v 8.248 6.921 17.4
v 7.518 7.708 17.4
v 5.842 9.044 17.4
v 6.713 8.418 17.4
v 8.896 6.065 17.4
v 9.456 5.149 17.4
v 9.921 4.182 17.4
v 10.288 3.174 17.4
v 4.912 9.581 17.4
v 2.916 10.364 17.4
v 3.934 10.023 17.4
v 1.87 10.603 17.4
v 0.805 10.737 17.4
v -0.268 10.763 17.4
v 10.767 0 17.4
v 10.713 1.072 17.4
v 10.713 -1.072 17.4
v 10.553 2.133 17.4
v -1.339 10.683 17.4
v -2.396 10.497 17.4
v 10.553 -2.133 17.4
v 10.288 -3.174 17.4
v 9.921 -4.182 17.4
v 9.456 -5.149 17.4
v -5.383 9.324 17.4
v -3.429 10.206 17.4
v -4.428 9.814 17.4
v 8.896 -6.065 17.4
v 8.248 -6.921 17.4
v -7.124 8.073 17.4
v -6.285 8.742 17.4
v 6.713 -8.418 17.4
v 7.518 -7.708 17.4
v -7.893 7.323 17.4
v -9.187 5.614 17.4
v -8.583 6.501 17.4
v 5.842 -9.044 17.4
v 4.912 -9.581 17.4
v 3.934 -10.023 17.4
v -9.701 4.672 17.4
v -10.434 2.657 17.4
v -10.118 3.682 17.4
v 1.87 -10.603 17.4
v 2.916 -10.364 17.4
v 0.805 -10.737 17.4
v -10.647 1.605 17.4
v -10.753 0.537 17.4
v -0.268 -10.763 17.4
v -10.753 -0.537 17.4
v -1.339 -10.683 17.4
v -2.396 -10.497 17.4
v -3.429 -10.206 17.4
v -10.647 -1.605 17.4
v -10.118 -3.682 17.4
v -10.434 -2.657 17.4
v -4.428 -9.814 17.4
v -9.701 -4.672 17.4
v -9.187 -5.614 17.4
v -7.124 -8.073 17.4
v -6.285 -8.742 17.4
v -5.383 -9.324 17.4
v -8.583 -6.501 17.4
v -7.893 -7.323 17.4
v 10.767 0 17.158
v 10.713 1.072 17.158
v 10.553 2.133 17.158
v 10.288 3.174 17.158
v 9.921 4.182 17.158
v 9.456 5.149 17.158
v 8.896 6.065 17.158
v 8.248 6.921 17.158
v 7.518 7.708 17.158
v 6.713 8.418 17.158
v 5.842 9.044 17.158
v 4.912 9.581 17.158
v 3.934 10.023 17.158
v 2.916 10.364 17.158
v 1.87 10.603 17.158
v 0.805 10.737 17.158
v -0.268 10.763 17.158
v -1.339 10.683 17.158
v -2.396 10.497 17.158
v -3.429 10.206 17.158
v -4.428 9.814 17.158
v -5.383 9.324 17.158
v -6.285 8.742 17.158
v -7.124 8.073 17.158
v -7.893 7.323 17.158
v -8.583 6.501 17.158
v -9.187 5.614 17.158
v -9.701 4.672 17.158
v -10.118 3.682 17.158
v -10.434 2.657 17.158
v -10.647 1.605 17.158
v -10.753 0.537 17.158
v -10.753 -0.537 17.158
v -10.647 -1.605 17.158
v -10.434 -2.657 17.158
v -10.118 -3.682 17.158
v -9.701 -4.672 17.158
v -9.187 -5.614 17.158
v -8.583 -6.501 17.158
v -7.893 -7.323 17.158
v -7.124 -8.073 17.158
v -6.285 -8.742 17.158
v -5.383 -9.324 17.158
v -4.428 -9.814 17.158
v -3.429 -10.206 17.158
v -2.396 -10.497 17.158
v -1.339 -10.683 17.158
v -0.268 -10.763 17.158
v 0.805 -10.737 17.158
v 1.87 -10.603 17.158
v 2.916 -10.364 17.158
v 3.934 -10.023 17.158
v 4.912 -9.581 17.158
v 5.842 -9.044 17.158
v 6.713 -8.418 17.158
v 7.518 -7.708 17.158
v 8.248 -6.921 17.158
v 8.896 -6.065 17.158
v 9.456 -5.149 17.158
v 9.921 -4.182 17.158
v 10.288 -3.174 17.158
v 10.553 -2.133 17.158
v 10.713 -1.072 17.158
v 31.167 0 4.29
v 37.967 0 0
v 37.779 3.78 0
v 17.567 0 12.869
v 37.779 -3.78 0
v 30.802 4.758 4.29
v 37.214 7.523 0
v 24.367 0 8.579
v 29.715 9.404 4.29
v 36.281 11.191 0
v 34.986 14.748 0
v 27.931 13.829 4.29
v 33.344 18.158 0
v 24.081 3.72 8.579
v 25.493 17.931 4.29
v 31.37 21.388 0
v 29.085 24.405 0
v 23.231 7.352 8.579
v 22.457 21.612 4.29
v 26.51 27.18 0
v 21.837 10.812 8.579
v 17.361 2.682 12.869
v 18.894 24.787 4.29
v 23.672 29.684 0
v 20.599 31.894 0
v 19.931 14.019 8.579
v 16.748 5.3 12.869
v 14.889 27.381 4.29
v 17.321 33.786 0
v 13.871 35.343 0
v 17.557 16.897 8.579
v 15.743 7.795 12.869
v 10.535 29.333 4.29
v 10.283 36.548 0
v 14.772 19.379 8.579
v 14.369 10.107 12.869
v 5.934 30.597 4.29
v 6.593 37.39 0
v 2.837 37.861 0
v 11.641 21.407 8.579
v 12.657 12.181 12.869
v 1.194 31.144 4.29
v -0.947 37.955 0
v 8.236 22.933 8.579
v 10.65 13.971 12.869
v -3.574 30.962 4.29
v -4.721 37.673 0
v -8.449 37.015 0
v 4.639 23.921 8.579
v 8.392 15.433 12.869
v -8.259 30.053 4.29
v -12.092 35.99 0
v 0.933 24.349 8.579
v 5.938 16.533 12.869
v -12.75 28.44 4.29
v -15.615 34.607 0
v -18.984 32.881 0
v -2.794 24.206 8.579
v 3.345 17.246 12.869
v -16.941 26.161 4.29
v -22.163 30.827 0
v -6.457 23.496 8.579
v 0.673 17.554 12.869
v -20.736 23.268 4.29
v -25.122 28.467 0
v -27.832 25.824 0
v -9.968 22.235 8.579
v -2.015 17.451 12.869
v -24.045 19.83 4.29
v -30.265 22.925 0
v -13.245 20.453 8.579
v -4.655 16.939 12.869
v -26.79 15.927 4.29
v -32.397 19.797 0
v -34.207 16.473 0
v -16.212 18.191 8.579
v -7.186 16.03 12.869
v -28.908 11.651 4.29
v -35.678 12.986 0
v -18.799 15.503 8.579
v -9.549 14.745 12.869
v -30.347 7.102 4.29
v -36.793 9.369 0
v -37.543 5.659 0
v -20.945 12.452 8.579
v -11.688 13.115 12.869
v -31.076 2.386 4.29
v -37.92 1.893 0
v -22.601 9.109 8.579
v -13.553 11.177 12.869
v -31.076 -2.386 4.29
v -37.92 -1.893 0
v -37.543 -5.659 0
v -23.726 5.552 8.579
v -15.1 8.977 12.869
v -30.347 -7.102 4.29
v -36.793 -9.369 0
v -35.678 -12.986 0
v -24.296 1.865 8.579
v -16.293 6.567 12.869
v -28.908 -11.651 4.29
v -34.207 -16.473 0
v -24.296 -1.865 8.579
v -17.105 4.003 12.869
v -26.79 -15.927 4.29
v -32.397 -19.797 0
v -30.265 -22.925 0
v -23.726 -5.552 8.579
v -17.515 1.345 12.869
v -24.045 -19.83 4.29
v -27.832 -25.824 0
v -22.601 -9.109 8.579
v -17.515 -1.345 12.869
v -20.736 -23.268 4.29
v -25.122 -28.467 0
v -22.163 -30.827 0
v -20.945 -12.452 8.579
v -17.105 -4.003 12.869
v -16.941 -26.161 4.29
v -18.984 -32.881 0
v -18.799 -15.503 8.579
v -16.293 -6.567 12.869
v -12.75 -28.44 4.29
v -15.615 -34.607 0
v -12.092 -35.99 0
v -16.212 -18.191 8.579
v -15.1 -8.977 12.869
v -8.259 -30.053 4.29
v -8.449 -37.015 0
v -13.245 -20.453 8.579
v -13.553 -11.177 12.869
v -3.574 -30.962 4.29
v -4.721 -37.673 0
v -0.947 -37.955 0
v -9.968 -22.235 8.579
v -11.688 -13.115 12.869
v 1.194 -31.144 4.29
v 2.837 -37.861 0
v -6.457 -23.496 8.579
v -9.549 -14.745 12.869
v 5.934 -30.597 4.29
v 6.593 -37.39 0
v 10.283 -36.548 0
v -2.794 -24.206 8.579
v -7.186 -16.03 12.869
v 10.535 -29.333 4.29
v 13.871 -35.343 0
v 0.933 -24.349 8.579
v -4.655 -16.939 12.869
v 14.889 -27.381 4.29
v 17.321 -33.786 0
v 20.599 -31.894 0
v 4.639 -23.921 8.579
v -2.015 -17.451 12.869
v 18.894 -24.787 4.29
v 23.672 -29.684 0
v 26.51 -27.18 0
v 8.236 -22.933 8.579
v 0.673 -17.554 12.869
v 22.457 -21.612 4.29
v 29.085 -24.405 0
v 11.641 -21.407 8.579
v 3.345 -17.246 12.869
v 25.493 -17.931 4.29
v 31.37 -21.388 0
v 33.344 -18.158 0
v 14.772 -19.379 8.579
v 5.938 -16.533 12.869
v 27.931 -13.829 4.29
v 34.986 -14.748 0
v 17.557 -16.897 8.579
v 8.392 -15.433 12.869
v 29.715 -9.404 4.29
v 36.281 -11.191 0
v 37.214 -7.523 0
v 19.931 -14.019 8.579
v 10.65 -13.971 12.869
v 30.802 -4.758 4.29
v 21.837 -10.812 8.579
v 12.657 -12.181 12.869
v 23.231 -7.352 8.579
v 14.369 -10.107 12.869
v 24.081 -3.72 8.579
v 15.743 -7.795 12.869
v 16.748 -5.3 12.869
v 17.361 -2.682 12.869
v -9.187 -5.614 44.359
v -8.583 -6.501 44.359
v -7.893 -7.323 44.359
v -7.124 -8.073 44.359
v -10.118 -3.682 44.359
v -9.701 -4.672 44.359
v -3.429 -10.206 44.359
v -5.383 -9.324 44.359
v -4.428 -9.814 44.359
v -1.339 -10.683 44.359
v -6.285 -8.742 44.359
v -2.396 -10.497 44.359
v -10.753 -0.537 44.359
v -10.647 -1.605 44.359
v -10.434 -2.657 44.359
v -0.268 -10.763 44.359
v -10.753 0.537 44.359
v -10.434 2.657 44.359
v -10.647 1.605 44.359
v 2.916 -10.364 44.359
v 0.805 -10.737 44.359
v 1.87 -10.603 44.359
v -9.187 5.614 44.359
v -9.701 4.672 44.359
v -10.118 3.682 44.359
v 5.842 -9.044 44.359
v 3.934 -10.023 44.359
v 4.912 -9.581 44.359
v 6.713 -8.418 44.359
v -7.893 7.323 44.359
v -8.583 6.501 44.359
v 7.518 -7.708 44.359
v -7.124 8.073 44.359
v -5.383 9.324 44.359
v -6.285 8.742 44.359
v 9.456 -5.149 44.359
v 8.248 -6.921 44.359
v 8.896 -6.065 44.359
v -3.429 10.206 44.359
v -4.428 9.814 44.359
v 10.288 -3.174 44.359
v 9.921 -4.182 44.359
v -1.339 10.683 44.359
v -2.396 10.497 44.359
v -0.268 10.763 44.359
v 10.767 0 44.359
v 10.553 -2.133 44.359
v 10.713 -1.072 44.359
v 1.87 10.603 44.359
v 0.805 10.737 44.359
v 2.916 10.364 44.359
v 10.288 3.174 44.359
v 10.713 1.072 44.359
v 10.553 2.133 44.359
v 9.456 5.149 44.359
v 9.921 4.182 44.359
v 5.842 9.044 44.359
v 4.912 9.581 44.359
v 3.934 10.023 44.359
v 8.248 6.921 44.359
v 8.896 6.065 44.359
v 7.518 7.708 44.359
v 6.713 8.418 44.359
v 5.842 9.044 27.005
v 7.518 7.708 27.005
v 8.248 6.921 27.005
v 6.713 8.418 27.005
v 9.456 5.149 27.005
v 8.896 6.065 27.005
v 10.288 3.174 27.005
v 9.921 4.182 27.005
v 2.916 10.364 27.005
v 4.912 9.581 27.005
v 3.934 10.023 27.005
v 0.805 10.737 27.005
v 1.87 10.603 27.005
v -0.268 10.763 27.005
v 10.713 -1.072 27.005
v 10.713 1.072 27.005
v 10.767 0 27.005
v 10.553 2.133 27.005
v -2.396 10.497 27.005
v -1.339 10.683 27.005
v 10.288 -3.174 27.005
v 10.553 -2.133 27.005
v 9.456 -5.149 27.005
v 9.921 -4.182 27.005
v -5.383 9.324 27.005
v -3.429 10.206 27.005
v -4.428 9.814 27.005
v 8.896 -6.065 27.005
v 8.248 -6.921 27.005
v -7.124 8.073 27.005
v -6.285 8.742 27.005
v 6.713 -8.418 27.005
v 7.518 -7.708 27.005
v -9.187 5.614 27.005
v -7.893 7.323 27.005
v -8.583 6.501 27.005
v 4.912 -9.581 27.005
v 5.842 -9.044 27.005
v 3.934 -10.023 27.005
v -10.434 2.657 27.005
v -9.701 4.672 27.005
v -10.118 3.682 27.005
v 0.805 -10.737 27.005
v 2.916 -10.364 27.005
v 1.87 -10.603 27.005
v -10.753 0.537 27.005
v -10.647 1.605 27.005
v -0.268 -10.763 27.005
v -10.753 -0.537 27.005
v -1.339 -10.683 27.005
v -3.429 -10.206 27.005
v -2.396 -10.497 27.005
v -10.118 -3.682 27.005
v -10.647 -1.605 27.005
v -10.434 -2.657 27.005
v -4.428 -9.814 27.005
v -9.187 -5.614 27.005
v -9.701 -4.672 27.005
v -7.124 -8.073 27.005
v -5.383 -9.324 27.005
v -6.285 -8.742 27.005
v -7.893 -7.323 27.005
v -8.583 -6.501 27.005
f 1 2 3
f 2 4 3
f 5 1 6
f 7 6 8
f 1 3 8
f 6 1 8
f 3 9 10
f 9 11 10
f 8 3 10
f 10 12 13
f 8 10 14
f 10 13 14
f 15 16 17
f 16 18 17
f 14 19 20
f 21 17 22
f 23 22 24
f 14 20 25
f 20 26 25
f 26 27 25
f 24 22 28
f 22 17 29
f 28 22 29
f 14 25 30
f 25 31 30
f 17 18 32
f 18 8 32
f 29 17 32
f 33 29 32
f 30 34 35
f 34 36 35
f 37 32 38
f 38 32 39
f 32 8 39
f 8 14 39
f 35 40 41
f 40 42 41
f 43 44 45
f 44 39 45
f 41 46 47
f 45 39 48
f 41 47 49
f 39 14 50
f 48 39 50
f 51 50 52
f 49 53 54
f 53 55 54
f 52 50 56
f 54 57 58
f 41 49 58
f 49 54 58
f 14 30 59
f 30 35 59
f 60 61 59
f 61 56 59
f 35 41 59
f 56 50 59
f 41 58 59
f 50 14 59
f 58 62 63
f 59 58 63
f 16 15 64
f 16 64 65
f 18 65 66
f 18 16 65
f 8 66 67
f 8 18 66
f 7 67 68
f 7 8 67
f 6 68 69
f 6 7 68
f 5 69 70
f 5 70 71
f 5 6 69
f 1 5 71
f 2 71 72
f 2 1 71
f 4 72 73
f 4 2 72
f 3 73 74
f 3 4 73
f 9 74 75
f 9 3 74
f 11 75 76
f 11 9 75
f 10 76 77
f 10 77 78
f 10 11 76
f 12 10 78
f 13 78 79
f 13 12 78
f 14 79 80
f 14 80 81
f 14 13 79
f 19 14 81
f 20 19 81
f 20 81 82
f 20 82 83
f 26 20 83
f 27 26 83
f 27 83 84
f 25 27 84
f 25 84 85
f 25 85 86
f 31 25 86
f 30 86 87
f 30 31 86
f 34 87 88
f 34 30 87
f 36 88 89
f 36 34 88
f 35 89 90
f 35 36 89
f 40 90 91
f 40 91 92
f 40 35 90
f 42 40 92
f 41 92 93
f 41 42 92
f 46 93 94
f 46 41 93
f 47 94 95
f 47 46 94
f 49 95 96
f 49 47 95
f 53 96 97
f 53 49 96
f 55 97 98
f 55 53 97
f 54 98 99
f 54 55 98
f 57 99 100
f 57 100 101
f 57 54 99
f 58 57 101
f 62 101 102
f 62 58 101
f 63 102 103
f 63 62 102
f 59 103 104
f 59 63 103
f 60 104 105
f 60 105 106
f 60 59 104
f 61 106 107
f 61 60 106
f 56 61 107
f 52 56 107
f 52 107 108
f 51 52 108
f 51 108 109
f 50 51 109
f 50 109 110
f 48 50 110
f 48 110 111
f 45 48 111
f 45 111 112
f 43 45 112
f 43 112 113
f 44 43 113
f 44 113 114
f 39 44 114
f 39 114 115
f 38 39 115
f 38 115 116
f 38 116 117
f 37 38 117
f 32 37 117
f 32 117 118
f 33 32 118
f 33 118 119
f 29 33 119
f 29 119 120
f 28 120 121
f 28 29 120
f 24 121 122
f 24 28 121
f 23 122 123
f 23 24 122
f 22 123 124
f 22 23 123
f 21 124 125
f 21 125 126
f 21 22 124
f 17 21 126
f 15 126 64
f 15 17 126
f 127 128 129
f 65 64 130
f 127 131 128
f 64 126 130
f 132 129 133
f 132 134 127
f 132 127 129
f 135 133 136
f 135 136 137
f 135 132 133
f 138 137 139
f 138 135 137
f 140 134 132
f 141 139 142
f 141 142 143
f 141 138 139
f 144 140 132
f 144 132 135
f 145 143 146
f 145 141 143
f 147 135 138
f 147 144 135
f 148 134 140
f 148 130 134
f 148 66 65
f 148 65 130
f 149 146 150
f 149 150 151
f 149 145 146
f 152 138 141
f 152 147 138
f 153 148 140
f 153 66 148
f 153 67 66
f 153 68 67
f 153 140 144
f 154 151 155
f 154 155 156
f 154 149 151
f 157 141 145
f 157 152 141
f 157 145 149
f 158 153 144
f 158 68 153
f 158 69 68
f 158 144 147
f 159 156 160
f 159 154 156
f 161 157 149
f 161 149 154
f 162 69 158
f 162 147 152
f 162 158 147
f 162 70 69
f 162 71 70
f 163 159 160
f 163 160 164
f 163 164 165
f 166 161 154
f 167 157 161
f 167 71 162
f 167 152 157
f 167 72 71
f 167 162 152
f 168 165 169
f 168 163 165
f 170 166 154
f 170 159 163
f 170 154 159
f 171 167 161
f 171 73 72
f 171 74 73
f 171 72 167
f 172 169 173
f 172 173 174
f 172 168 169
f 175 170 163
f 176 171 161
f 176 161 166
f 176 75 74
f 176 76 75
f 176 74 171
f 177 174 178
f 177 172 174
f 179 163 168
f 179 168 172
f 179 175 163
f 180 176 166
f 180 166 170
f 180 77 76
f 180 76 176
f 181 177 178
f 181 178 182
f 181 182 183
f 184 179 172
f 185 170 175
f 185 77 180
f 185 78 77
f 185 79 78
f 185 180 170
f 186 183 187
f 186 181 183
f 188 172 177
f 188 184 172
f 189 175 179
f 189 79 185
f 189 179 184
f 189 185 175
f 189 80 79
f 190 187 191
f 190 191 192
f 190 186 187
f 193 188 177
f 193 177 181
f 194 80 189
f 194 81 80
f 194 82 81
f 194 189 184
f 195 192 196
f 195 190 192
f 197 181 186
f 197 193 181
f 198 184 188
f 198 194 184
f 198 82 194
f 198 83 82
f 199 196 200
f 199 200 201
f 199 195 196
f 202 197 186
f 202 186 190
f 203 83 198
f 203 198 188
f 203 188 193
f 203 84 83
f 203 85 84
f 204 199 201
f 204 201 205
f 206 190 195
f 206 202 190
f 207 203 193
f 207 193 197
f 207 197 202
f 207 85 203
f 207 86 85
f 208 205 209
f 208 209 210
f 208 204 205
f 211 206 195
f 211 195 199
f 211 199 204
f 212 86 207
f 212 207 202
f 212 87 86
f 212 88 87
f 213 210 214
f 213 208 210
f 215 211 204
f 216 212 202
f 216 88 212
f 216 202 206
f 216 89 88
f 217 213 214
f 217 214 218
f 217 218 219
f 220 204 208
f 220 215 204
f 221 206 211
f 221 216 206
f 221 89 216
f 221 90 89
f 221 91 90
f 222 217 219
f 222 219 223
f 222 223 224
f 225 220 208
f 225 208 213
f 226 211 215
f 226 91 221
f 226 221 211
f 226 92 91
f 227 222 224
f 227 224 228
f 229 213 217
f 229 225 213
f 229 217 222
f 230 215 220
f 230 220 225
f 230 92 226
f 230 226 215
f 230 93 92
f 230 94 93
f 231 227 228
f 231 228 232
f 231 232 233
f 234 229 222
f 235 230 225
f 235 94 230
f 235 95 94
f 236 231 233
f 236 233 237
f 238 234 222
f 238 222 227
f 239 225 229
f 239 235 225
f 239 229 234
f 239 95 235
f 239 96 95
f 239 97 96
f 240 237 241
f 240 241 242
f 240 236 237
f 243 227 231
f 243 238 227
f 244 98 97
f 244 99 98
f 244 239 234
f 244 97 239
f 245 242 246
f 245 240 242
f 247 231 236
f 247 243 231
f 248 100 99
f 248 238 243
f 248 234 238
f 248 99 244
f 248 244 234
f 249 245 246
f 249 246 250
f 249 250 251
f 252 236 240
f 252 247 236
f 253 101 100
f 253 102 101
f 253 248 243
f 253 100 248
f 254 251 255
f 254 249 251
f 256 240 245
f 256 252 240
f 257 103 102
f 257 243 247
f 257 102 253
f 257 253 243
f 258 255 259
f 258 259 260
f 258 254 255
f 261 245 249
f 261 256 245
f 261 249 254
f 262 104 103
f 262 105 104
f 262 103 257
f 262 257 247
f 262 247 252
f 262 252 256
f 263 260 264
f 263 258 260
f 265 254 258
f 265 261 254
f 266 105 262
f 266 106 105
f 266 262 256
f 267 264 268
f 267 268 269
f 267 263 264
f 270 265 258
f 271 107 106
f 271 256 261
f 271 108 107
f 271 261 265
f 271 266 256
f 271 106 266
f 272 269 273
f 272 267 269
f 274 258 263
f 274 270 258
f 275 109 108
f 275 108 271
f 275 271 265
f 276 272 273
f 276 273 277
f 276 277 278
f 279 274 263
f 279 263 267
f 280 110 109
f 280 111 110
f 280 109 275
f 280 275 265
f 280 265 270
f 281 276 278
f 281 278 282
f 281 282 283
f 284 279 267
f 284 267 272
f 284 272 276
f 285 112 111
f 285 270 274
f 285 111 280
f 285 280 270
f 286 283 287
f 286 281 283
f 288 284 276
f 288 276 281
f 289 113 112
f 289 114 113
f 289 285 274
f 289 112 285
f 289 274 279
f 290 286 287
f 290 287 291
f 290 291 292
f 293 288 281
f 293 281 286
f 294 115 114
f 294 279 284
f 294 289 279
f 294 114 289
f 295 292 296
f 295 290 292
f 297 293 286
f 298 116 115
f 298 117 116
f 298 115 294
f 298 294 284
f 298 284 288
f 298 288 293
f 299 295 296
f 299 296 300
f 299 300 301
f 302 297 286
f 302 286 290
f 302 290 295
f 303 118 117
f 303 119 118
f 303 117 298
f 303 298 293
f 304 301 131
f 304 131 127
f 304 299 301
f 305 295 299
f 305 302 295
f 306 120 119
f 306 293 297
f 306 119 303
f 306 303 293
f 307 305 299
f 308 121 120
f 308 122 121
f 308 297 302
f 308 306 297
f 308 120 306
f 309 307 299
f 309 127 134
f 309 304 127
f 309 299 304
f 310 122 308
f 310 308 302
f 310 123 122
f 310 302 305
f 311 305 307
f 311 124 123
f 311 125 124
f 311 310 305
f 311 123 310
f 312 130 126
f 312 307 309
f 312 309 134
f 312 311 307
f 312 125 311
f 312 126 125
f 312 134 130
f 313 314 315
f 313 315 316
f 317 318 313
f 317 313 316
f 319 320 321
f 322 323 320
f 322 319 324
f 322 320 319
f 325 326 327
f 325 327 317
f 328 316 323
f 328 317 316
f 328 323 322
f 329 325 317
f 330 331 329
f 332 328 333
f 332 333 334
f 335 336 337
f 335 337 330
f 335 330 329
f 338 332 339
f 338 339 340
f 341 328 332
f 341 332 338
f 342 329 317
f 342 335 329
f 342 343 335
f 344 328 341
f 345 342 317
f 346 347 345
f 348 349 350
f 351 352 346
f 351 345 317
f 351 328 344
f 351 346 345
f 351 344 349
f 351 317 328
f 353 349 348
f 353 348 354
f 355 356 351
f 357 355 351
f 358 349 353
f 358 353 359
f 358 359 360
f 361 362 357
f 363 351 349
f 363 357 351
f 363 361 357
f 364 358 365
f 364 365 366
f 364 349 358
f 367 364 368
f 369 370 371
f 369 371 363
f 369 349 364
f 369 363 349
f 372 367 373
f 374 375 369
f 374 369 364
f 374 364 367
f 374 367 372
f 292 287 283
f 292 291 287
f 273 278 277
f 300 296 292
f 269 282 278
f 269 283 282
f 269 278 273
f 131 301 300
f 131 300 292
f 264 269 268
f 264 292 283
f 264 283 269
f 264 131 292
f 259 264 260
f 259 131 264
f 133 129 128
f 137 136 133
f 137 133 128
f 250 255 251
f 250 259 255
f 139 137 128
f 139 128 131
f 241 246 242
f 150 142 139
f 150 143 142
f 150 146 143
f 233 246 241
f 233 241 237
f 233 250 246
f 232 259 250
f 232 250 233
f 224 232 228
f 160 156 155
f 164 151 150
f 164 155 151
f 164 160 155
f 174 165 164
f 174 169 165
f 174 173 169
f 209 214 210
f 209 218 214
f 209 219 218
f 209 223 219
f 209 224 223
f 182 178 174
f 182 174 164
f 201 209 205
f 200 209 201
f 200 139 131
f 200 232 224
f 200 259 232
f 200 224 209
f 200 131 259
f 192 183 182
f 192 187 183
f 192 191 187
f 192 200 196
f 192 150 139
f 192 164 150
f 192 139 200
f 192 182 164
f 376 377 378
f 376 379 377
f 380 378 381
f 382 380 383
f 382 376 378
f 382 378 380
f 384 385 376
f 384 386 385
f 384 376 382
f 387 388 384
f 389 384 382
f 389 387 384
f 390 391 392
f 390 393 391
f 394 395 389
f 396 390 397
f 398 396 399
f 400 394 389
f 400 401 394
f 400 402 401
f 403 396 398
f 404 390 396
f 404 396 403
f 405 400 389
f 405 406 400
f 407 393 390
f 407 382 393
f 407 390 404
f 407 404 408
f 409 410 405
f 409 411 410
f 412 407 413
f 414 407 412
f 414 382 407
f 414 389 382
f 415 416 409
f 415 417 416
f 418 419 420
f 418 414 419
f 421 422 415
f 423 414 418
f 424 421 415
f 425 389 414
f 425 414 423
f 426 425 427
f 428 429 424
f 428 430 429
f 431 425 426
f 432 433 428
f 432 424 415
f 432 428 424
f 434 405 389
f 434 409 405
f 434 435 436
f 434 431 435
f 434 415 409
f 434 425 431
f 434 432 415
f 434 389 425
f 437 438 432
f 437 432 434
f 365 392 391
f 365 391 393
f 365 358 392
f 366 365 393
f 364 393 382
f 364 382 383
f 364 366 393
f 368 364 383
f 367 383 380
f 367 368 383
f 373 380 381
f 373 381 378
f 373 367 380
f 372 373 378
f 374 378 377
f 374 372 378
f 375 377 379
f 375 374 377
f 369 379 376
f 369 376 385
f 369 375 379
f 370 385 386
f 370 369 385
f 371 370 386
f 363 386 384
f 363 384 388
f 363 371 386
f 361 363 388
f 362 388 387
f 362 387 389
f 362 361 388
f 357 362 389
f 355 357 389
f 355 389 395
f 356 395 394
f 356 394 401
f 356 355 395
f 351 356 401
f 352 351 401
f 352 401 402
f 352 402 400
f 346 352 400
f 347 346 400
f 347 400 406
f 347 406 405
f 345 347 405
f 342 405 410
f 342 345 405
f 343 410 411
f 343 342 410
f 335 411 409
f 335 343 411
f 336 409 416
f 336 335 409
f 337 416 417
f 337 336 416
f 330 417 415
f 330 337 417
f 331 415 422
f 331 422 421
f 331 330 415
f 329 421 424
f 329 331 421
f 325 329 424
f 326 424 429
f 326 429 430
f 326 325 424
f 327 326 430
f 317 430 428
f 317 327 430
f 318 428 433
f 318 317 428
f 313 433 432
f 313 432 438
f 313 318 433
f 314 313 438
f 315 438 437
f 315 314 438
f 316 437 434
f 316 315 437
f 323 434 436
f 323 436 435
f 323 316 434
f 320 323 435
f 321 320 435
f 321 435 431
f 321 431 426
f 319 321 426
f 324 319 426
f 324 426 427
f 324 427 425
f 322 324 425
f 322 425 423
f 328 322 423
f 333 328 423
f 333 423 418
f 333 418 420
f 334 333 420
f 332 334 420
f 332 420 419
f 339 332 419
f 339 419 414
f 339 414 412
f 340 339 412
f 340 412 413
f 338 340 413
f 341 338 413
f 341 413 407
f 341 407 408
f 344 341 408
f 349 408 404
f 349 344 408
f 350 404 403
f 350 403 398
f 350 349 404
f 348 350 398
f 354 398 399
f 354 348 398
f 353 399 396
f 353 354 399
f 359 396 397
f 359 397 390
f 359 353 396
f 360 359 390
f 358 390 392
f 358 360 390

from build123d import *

# Parameters (mm, degrees)
F2_W = 11.047998
F2_H = 9.604889


with BuildPart() as f1:
    # F0 (on Front) → F1 (revolve)
    with BuildSketch(Plane.XZ):
        Polygon((0, 44.358619), (0, 0), (37.967291, 0), (10.766834, 17.158164), (10.766834, 44.358619), align=None)
    revolve(axis=Axis((0, 0, 22.179309), (0, 0, 1)))

    # F2 (on Right) → F3 (revolve, cut)
    with BuildSketch(Plane.YZ):
        with Locations((-5.523999, 22.20278)):
            Rectangle(F2_W, F2_H)
    revolve(axis=Axis((0, 0, 22.20278), (0, 0, -1)), mode=Mode.SUBTRACT)


solid = f1.part
